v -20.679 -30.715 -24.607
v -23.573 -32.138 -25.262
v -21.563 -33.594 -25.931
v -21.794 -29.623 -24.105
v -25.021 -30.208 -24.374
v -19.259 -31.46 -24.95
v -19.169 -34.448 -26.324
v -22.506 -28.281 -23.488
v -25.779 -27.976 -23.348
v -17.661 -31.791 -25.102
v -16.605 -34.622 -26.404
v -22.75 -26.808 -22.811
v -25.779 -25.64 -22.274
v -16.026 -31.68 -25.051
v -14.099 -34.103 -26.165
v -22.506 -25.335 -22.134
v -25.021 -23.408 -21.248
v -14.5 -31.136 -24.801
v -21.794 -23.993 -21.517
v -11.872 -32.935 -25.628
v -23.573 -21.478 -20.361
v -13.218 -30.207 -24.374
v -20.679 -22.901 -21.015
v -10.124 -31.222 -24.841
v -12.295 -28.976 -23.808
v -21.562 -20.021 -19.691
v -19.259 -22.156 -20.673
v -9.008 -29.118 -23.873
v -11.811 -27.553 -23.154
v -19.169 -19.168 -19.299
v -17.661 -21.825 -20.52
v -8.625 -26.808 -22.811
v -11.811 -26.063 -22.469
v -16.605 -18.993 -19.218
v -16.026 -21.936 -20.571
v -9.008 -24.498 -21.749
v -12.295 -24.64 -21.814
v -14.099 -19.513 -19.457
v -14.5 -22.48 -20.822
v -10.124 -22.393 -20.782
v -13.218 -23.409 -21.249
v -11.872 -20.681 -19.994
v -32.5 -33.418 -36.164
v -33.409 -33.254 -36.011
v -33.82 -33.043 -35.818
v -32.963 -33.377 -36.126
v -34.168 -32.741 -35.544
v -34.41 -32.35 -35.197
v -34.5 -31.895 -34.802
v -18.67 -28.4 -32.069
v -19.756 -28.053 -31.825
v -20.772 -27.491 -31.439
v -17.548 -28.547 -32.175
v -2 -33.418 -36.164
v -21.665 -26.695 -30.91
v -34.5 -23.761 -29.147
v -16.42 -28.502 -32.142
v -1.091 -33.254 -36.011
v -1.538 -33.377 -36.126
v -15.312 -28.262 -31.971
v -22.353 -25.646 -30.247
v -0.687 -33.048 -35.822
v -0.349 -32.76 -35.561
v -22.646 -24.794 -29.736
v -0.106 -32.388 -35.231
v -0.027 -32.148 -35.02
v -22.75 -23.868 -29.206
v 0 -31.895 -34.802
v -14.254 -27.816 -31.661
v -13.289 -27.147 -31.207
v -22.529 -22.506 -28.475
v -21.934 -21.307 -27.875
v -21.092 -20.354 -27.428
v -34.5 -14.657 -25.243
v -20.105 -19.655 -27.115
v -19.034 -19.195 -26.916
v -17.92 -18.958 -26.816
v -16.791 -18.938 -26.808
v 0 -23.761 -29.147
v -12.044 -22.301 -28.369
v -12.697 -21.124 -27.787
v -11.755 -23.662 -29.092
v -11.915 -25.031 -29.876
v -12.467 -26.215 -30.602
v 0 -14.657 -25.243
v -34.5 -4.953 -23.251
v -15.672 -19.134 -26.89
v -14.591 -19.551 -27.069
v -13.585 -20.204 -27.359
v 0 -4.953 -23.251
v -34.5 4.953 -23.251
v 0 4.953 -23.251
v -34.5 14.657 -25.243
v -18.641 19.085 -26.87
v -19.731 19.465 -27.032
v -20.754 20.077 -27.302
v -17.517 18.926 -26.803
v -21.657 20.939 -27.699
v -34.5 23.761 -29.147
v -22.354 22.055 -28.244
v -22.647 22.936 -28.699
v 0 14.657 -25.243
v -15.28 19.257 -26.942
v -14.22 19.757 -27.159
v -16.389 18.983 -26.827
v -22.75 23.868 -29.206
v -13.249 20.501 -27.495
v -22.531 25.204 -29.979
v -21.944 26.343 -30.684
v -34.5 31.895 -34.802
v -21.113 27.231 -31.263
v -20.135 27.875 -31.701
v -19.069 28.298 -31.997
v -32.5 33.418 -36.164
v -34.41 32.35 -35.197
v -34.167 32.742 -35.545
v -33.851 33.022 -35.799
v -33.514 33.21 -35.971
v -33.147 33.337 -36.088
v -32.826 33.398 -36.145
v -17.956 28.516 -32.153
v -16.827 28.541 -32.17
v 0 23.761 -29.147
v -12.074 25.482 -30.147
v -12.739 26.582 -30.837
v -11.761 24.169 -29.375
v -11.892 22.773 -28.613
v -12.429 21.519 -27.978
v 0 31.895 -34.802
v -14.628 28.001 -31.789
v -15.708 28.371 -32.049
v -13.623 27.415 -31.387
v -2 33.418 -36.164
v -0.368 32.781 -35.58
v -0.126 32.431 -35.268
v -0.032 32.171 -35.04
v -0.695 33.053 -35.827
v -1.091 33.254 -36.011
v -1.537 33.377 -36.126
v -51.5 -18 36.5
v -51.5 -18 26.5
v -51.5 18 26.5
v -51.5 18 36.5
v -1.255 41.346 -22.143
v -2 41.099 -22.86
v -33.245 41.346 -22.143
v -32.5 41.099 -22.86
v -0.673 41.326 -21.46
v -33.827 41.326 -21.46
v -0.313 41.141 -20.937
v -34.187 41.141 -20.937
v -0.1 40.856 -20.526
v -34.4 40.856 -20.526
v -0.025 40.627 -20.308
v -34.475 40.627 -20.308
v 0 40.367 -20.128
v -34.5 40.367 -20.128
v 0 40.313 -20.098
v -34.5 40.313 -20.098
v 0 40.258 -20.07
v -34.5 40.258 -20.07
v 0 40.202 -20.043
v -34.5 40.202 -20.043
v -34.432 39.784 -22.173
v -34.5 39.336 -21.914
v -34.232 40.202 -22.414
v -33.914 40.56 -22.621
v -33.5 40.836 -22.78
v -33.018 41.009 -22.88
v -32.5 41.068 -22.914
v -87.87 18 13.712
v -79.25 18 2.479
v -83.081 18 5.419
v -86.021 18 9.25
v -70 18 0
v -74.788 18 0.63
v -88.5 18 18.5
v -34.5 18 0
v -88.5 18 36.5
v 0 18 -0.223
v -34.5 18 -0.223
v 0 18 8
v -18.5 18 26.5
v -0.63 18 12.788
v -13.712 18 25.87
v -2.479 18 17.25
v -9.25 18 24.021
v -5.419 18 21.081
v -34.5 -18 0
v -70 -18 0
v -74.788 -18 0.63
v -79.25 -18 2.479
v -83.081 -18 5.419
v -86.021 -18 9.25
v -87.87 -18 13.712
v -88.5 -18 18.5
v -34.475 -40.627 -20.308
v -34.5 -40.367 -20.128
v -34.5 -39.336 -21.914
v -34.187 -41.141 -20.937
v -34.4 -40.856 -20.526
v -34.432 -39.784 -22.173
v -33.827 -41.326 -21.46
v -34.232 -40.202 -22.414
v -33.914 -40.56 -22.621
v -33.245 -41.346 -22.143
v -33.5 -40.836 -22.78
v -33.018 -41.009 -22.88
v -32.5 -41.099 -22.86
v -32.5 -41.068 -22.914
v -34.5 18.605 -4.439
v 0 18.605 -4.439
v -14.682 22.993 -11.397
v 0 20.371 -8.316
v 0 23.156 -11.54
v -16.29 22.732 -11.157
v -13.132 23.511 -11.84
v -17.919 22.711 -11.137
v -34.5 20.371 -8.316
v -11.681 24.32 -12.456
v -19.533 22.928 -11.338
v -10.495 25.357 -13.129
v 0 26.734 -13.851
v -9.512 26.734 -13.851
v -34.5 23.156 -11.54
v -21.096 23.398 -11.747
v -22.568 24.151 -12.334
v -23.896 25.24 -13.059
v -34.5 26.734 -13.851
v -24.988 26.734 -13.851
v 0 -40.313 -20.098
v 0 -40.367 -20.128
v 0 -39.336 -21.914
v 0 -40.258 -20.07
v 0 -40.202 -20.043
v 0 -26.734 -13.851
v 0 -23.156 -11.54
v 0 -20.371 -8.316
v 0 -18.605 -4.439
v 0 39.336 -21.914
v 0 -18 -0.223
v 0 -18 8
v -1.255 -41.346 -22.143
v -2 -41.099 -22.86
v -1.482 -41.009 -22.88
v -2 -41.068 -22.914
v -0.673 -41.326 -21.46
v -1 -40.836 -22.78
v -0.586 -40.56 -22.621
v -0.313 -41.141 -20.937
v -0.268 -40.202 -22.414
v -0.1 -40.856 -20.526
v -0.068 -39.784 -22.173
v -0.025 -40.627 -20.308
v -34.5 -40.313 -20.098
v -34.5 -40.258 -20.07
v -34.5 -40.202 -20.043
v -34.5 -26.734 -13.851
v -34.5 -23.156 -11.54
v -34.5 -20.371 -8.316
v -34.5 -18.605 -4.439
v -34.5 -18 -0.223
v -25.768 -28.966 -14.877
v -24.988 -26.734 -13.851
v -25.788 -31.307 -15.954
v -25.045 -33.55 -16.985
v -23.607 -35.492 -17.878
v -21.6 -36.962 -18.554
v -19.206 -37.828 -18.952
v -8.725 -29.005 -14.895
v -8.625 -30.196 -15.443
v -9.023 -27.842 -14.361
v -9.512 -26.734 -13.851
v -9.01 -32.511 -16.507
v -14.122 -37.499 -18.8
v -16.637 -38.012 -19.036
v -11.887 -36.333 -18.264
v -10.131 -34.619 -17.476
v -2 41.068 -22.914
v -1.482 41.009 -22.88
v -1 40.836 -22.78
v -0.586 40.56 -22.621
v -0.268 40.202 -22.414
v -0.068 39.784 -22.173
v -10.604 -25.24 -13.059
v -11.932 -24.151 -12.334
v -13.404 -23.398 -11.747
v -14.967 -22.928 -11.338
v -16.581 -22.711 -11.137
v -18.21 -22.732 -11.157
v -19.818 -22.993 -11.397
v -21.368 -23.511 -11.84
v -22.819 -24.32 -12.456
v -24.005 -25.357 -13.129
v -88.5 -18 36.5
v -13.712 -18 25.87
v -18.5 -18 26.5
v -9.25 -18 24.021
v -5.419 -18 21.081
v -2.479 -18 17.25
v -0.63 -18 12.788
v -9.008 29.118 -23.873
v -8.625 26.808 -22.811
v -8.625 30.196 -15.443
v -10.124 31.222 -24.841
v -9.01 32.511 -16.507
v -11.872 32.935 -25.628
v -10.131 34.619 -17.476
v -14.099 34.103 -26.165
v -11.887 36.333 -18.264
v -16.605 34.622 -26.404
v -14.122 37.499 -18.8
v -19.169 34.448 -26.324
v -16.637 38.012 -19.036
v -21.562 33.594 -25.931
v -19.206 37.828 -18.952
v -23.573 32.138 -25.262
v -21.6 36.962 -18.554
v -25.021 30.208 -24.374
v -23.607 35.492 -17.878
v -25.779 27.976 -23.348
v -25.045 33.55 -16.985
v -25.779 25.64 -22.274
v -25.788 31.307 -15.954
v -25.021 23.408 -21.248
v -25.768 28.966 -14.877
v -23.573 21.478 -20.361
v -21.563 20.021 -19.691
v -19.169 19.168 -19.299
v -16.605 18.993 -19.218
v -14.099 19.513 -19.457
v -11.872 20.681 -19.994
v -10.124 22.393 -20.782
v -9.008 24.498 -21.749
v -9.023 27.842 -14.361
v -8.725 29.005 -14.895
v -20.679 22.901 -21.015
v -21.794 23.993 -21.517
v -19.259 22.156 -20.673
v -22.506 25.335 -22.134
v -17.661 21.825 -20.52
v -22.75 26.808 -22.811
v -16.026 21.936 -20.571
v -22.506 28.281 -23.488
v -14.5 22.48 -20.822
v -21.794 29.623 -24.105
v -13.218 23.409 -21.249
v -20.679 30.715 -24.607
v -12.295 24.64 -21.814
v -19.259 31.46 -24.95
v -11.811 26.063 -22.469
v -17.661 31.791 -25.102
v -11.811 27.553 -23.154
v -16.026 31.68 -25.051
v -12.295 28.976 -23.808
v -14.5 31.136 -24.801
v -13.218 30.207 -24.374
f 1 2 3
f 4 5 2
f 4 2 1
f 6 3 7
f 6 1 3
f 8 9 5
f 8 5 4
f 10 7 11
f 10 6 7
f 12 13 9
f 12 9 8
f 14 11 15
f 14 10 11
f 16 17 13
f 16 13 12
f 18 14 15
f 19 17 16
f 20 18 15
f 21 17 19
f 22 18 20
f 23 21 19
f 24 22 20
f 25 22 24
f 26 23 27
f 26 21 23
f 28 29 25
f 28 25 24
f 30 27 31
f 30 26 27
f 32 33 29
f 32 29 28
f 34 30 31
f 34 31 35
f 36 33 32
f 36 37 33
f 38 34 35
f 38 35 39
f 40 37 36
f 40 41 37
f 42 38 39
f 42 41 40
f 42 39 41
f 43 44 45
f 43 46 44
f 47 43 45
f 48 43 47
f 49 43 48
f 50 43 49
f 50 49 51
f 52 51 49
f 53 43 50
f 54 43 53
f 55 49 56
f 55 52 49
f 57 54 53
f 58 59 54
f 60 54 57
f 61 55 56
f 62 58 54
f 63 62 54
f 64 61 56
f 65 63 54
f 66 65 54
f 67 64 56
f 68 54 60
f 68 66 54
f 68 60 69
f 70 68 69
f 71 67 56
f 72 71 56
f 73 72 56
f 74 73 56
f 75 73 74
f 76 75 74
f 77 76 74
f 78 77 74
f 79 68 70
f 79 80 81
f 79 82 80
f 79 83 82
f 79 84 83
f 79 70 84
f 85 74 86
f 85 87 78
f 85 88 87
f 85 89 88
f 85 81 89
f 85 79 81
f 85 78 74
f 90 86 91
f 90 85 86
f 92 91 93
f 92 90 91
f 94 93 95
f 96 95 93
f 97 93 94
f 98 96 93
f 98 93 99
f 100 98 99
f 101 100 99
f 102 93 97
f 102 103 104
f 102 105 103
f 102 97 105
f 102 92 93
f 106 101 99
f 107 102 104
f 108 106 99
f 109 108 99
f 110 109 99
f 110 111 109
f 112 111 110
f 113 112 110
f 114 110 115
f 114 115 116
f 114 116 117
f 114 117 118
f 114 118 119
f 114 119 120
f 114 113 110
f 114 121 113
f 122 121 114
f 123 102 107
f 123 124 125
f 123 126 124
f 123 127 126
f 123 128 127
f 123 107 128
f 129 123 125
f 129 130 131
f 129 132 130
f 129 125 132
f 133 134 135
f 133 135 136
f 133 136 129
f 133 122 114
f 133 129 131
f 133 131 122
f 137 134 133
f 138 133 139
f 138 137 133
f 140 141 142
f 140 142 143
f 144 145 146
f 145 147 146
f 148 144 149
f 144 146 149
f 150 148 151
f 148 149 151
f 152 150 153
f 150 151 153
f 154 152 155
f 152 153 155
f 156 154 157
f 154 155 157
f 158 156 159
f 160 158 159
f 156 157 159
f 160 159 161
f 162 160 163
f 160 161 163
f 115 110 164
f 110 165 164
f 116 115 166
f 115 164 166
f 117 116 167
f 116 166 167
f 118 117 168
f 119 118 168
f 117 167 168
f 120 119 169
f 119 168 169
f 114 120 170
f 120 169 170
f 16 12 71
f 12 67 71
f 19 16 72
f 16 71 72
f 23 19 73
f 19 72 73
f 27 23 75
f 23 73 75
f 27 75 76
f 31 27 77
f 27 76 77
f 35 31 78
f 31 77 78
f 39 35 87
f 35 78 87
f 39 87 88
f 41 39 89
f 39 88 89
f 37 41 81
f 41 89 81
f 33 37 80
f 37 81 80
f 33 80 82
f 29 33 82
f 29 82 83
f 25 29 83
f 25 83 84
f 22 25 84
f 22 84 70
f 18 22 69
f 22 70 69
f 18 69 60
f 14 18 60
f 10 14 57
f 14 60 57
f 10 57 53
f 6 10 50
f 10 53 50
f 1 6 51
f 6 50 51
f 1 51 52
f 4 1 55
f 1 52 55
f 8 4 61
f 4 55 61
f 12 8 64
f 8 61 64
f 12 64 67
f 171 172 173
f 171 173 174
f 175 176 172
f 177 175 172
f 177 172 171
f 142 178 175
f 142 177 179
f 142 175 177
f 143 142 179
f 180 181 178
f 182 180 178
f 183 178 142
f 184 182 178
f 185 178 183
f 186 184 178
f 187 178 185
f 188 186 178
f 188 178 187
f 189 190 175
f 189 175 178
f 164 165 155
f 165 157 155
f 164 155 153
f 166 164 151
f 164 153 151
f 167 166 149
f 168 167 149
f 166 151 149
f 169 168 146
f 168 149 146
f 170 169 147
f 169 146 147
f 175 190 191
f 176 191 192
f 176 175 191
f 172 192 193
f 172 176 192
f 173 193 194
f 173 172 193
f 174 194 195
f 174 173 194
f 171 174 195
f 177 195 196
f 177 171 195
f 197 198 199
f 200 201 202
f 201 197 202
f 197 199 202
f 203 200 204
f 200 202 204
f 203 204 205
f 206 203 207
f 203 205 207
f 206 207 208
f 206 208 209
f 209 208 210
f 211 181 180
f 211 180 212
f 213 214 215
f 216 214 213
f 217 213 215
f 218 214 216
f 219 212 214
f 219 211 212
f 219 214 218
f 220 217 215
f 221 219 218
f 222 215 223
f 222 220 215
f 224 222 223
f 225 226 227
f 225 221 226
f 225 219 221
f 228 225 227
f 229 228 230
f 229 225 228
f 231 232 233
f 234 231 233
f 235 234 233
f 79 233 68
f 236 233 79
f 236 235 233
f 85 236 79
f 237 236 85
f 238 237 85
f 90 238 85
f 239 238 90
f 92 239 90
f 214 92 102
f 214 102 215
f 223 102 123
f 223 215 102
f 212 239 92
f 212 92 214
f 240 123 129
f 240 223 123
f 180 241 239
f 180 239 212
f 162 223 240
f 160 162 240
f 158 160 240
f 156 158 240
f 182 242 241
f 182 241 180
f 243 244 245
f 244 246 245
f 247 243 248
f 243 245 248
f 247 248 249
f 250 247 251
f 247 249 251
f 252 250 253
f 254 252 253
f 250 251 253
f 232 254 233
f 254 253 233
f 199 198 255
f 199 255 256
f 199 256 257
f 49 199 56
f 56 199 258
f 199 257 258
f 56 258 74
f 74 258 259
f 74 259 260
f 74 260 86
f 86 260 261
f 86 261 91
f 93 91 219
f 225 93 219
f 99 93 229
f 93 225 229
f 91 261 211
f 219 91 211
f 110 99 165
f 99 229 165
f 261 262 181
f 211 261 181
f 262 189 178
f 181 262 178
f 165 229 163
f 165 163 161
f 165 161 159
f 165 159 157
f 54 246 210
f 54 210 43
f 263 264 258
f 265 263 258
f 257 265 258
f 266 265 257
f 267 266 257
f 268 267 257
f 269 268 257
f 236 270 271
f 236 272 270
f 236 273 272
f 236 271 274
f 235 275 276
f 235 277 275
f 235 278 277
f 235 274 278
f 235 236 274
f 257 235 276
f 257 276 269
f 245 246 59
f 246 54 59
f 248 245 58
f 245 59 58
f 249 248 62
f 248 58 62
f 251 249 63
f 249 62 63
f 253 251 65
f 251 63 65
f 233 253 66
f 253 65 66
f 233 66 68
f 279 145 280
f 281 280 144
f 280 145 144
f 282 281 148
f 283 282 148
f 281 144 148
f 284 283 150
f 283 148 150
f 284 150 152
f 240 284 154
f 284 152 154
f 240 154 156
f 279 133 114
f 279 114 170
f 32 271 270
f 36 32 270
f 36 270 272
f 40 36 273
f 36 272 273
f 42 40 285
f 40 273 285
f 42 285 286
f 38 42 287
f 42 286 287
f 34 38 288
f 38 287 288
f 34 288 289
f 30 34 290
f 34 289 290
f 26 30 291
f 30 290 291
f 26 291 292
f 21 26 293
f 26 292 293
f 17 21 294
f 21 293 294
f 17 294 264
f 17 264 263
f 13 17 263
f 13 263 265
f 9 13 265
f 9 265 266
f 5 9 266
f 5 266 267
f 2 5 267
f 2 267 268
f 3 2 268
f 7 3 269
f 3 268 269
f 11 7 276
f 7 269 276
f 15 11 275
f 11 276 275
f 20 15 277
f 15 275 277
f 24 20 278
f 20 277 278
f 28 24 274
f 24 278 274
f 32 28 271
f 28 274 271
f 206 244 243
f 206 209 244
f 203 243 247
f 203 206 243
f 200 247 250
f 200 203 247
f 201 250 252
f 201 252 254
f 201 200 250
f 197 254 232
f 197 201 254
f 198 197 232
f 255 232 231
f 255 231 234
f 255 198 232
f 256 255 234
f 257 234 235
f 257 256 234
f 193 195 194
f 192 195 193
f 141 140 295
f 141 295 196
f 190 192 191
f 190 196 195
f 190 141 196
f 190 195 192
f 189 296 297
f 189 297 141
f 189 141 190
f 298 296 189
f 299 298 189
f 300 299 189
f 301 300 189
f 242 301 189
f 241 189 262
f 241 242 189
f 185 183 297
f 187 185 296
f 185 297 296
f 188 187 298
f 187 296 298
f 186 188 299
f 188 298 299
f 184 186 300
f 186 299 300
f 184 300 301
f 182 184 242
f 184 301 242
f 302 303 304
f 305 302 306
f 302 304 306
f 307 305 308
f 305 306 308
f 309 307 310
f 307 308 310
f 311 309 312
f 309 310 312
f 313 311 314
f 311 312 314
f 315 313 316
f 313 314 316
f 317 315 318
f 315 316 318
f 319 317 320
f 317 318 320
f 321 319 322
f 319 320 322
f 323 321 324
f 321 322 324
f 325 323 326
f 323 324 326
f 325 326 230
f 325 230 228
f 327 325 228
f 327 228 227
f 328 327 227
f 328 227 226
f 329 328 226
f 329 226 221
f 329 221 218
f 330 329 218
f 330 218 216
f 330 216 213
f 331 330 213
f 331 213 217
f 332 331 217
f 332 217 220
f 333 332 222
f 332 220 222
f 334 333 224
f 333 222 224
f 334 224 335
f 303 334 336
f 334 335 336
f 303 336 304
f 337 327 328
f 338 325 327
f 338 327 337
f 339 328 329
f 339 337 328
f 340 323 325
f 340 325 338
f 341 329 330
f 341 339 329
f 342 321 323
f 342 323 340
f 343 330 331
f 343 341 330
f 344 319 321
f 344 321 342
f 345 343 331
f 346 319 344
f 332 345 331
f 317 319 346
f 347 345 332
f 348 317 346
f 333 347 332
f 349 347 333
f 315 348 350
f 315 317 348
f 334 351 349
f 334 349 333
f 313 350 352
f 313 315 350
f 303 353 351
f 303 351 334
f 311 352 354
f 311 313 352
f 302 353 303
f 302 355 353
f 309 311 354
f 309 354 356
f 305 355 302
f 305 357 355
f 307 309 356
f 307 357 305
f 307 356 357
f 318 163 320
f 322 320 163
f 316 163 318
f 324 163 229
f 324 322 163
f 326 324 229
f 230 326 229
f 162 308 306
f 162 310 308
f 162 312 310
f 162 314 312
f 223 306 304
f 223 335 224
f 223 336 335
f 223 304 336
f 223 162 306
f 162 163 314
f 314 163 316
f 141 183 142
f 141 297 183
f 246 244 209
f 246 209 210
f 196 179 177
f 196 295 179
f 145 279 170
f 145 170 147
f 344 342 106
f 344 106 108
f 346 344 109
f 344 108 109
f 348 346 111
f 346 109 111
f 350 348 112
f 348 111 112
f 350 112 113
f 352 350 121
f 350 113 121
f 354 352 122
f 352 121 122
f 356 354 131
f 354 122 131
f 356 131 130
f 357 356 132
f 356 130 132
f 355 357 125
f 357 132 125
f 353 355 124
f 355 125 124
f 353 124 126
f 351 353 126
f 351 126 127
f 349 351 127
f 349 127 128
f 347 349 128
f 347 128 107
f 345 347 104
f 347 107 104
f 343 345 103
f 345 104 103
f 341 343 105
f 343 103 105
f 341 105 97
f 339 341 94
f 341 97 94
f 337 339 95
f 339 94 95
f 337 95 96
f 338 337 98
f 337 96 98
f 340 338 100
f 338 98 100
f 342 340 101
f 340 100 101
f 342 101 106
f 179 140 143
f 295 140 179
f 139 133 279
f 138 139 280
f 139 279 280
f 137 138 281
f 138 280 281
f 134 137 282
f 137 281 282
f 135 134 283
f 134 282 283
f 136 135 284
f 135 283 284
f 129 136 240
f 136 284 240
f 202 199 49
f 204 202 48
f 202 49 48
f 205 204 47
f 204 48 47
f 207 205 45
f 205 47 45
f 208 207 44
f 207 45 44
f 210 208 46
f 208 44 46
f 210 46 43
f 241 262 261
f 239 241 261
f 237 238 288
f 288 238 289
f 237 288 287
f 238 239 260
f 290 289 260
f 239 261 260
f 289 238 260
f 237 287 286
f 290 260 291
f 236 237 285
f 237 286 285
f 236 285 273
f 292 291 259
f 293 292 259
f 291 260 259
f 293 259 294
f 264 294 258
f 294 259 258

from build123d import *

# Parameters (mm, degrees)
F1_DEPTH        = 18
F2_R            = 18.5
F4_DEPTH        = 34.5
F5_R            = 15
F7_DEPTH        = 34.5
F11_D           = 11
F11_CBORE_D     = 17.25
F11_CBORE_DEPTH = 10
F14_D           = 11
F14_CBORE_D     = 17.25
F14_CBORE_DEPTH = 10
F15_R           = 2


with BuildPart() as f1:
    # F0 (on Front) → F1 (new body, symmetric)
    with BuildSketch(Plane.XZ):
        Polygon((-88.5, 0), (0, 0), (0, 26.5), (-51.5, 26.5), (-51.5, 36.5), (-88.5, 36.5), align=None)
    extrude(amount=F1_DEPTH, both=True)

    # F2
    f2_edges = [f1.edges().sort_by_distance(p)[0] for p in [
        (0, 0, 26.5),
        (-88.5, 0, 0),
    ]]
    fillet(f2_edges, radius=F2_R)

    # F3 (on face) → F4 (join)
    with BuildSketch(Plane.YZ):
        with BuildLine():
            Line((-41.0676798294, -22.9138953121), (-33.4179196431, -36.1636686207))
            ThreePointArc((-33.4179196431, -36.1636686207), (0, -23), (33.4179196431, -36.1636686207))
            Line((33.4179196431, -36.1636686207), (41.0676798294, -22.9138953121))
            ThreePointArc((41.0676798294, -22.9138953121), (30.1704829466, -15.557622669), (18, -10.5833898689))
            ThreePointArc((18, -10.5833898689), (0, -8), (-18, -10.5833898689))
            ThreePointArc((-18, -10.5833898689), (-30.1704829466, -15.557622669), (-41.0676798294, -22.9138953121))
        make_face()
        with BuildLine():
            Line((-18, 0), (-18, -10.5833898689))
            ThreePointArc((-18, -10.5833898689), (0, -8), (18, -10.5833898689))
            Line((18, -10.5833898689), (18, 0))
            Line((18, 0), (-18, 0))
        make_face()
    extrude(amount=-F4_DEPTH)

    # F5
    f5_edges = [f1.edges().sort_by_distance(p)[0] for p in [
        (-17.25, -18, -10.58339),
        (-17.25, 18, -10.58339),
    ]]
    fillet(f5_edges, radius=F5_R)

    # F6 (on face) → F7 (join)
    with BuildSketch(Plane.YZ):
        Polygon((-41.0676798294, -22.9138953121), (-26.7341772152, -13.8511928873), (-42.1958866534, -20.9597837716), align=None)
        Polygon((42.1958866534, -20.9597837716), (26.7341772152, -13.8511928873), (41.0676798294, -22.9138953121), align=None)
    extrude(amount=-F7_DEPTH)

    # F11 (through all)
    with Locations(Plane(origin=(0, -0.1973911234, 0.4293402511), x_dir=(1, 0, 0), z_dir=(0, -0.417721519, 0.9085751111))):
        with Locations((-17.25, -33.8857312325)):
            CounterBoreHole(F11_D / 2, F11_CBORE_D / 2, F11_CBORE_DEPTH)

    # F14 (through all)
    with Locations(Plane(origin=(0, 0.1973911234, 0.4293402511), x_dir=(1, 0, 0), z_dir=(0, 0.417721519, 0.9085751111))):
        with Locations((-17.25, 33.8857312325)):
            CounterBoreHole(F14_D / 2, F14_CBORE_D / 2, F14_CBORE_DEPTH)

    # F15
    f15_edges = [f1.edges().sort_by_distance(p)[0] for p in [
        (0, -37.806903, -28.561726),
        (-17.25, -42.195887, -20.959784),
        (-34.5, -37.806903, -28.561726),
        (-17.25, 42.195887, -20.959784),
        (0, 37.806903, -28.561726),
        (-34.5, 37.806903, -28.561726),
    ]]
    fillet(f15_edges, radius=F15_R)


solid = f1.part
